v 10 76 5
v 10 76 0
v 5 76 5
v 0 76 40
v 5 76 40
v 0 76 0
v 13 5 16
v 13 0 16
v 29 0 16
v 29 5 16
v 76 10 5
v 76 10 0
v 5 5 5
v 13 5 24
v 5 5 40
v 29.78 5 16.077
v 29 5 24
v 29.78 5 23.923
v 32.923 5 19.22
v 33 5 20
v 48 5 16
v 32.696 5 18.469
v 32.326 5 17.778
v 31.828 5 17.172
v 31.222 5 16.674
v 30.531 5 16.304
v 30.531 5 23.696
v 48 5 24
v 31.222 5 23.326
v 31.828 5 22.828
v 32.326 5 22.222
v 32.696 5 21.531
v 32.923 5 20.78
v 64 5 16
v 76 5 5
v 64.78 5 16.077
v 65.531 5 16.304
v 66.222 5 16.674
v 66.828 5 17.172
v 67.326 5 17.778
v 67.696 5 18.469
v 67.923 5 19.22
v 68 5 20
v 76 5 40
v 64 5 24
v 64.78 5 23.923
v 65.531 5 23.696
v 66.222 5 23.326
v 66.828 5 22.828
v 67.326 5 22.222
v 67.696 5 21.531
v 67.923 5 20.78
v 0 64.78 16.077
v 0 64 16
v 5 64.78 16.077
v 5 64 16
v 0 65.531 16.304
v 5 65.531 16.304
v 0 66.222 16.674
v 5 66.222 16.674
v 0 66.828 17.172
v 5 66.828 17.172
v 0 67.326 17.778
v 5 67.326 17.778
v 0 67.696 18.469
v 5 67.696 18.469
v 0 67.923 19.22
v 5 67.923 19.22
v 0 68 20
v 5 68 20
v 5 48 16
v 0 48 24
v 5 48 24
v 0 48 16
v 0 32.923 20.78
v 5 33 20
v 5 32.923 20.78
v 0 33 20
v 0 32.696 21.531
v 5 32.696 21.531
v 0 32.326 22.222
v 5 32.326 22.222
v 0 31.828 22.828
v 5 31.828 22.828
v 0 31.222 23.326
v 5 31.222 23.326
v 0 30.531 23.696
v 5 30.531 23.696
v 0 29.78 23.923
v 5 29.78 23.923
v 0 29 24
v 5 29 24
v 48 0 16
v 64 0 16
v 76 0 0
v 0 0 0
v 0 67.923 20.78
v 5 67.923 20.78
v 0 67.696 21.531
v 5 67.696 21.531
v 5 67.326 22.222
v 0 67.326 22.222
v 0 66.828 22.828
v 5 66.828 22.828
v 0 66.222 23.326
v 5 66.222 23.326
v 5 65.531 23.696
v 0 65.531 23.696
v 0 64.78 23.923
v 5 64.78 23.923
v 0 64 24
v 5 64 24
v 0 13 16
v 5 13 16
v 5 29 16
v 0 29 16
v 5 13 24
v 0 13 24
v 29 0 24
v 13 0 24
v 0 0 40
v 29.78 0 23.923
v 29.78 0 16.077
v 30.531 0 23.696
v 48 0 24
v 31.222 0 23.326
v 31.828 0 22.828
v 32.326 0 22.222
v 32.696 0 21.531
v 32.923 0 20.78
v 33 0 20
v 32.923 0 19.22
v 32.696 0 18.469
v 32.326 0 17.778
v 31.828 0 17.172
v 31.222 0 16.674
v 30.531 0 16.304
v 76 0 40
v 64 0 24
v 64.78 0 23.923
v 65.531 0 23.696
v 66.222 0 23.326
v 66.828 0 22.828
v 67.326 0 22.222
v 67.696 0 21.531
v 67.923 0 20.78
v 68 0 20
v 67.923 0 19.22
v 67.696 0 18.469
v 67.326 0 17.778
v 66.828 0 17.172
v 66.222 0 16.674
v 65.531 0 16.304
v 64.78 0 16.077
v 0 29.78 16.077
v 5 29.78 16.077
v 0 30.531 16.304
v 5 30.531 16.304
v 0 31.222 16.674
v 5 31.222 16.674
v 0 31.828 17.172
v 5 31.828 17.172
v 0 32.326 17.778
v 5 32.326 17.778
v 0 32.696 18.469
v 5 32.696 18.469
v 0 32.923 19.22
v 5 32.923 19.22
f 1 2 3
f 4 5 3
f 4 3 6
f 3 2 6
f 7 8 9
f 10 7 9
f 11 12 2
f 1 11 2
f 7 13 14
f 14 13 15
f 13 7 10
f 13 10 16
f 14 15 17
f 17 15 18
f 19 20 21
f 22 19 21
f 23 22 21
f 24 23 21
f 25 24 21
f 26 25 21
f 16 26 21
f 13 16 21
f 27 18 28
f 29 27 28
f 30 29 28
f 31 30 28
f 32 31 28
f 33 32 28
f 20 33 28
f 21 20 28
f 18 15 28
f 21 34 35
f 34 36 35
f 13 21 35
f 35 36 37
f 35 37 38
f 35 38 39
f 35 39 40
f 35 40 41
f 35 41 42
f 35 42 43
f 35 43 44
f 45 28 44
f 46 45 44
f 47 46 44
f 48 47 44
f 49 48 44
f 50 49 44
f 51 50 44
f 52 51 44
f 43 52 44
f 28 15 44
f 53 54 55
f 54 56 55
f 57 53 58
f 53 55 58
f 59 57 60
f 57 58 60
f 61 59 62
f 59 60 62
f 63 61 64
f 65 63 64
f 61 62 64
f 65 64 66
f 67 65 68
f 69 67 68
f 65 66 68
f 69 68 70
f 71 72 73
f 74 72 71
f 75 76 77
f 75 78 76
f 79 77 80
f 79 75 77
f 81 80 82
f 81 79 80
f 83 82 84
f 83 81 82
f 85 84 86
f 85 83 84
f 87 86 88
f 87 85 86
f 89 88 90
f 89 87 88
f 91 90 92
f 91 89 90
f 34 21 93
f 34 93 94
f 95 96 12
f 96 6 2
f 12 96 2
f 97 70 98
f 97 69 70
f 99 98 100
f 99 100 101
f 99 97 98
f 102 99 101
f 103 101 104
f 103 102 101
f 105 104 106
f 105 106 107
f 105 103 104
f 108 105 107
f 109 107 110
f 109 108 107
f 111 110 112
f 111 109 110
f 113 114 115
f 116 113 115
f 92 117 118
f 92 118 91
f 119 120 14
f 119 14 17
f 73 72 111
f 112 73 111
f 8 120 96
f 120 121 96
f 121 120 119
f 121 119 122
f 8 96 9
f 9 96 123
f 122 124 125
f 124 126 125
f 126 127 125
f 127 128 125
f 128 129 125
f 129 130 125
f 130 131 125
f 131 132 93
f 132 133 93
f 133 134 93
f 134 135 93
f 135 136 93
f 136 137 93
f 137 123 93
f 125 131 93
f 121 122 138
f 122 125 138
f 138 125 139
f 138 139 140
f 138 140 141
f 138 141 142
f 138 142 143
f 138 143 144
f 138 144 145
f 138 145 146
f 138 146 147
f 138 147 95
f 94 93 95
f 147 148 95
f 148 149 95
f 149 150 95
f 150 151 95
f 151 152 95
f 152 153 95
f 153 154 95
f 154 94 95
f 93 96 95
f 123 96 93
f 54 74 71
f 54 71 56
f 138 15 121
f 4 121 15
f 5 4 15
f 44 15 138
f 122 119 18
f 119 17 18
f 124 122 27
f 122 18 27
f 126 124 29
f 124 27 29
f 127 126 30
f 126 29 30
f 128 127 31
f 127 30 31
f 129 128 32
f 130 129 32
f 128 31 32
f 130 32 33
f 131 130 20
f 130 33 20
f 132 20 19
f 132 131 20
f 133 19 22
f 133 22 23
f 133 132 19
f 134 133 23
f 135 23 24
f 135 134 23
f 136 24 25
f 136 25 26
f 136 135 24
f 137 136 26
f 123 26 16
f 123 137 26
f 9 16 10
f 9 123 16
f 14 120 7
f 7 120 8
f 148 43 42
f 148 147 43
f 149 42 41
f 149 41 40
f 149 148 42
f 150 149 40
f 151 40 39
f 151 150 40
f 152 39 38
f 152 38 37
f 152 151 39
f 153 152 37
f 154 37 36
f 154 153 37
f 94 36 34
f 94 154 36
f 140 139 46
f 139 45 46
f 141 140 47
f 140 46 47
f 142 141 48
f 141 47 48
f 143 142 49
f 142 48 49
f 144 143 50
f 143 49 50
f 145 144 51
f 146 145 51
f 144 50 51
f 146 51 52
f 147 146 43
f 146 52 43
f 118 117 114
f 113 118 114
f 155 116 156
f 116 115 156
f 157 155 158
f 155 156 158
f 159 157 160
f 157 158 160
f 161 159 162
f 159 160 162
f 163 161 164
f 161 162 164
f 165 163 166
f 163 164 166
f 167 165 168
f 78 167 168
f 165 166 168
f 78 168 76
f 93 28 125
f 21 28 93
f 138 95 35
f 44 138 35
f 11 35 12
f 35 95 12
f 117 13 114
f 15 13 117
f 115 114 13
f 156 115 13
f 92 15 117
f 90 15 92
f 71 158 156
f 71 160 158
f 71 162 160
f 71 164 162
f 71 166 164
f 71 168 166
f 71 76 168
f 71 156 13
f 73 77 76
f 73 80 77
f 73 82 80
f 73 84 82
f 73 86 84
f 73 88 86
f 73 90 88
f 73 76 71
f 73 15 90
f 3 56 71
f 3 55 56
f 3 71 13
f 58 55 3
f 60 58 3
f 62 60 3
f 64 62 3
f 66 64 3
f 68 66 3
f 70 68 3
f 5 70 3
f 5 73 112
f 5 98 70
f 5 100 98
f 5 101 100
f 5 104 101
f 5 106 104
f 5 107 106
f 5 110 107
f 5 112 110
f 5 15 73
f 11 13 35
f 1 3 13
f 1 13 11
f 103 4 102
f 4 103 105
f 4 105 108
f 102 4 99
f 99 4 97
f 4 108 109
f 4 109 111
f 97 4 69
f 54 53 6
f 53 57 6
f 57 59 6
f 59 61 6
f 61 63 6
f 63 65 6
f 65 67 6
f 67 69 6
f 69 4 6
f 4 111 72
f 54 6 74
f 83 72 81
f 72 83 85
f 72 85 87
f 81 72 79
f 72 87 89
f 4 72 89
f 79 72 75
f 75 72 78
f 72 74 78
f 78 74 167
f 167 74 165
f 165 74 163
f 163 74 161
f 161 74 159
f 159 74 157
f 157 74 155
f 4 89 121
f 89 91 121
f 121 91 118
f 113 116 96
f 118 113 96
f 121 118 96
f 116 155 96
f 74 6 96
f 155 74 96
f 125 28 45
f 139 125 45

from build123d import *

# Parameters (mm, degrees)
BOSS_EXTRUDE1_DEPTH = 40
SKETCH2_W           = 71
SKETCH2_H           = 71
CUT_EXTRUDE1_DEPTH  = 35
SKETCH3_W           = 20
SKETCH3_H           = 8
CUT_EXTRUDE2_DEPTH  = 22.5
CIRPATTERN1_COUNT   = 2
CIRPATTERN1_ANGLE   = 90
FILLET1_R           = 4


with BuildPart() as part:
    # Sketch1 → Boss-Extrude1 (new body)
    with BuildSketch(Plane.XY):
        Polygon((0, 76), (0, 0), (76, 0), (76, 10), (10, 76), align=None)
    extrude(amount=BOSS_EXTRUDE1_DEPTH)

    # Sketch2 → Cut-Extrude1 (cut)
    with BuildSketch(Plane.XY.offset(40)):
        with Locations((40.5, 40.5)):
            Rectangle(SKETCH2_W, SKETCH2_H)
    extrude(amount=-CUT_EXTRUDE1_DEPTH, mode=Mode.SUBTRACT)

    # Sketch3 → Cut-Extrude2 (cut, symmetric)
    with BuildSketch(Plane(origin=(0, 5, 0), x_dir=(1, 0, 0), z_dir=(0, 1, 0))):
        with Locations((23, -20)):
            Rectangle(SKETCH3_W, SKETCH3_H)
        with Locations((58, -20)):
            Rectangle(SKETCH3_W, SKETCH3_H)
    cut_extrude2 = extrude(amount=CUT_EXTRUDE2_DEPTH, both=True, mode=Mode.SUBTRACT)

    # CirPattern1: Cut-Extrude2 ×2 about axis
    cirpattern1_axis = Axis((0, 0, 40), (0, 0, 1))
    for i in range(1, CIRPATTERN1_COUNT):
        add(cut_extrude2.rotate(cirpattern1_axis, i * CIRPATTERN1_ANGLE / (CIRPATTERN1_COUNT - 1)), mode=Mode.SUBTRACT)

    # Fillet1
    fillet1_edges = [part.edges().sort_by_distance(p)[0] for p in [
        (68, 2.5, 24),
        (68, 2.5, 16),
        (33, 2.5, 24),
        (33, 2.5, 16),
        (2.5, 33, 24),
        (2.5, 33, 16),
        (2.5, 68, 24),
        (2.5, 68, 16),
    ]]
    fillet(fillet1_edges, radius=FILLET1_R - 0.0001)  # a hair under: the kernel refuses the full size


solid = part.part
